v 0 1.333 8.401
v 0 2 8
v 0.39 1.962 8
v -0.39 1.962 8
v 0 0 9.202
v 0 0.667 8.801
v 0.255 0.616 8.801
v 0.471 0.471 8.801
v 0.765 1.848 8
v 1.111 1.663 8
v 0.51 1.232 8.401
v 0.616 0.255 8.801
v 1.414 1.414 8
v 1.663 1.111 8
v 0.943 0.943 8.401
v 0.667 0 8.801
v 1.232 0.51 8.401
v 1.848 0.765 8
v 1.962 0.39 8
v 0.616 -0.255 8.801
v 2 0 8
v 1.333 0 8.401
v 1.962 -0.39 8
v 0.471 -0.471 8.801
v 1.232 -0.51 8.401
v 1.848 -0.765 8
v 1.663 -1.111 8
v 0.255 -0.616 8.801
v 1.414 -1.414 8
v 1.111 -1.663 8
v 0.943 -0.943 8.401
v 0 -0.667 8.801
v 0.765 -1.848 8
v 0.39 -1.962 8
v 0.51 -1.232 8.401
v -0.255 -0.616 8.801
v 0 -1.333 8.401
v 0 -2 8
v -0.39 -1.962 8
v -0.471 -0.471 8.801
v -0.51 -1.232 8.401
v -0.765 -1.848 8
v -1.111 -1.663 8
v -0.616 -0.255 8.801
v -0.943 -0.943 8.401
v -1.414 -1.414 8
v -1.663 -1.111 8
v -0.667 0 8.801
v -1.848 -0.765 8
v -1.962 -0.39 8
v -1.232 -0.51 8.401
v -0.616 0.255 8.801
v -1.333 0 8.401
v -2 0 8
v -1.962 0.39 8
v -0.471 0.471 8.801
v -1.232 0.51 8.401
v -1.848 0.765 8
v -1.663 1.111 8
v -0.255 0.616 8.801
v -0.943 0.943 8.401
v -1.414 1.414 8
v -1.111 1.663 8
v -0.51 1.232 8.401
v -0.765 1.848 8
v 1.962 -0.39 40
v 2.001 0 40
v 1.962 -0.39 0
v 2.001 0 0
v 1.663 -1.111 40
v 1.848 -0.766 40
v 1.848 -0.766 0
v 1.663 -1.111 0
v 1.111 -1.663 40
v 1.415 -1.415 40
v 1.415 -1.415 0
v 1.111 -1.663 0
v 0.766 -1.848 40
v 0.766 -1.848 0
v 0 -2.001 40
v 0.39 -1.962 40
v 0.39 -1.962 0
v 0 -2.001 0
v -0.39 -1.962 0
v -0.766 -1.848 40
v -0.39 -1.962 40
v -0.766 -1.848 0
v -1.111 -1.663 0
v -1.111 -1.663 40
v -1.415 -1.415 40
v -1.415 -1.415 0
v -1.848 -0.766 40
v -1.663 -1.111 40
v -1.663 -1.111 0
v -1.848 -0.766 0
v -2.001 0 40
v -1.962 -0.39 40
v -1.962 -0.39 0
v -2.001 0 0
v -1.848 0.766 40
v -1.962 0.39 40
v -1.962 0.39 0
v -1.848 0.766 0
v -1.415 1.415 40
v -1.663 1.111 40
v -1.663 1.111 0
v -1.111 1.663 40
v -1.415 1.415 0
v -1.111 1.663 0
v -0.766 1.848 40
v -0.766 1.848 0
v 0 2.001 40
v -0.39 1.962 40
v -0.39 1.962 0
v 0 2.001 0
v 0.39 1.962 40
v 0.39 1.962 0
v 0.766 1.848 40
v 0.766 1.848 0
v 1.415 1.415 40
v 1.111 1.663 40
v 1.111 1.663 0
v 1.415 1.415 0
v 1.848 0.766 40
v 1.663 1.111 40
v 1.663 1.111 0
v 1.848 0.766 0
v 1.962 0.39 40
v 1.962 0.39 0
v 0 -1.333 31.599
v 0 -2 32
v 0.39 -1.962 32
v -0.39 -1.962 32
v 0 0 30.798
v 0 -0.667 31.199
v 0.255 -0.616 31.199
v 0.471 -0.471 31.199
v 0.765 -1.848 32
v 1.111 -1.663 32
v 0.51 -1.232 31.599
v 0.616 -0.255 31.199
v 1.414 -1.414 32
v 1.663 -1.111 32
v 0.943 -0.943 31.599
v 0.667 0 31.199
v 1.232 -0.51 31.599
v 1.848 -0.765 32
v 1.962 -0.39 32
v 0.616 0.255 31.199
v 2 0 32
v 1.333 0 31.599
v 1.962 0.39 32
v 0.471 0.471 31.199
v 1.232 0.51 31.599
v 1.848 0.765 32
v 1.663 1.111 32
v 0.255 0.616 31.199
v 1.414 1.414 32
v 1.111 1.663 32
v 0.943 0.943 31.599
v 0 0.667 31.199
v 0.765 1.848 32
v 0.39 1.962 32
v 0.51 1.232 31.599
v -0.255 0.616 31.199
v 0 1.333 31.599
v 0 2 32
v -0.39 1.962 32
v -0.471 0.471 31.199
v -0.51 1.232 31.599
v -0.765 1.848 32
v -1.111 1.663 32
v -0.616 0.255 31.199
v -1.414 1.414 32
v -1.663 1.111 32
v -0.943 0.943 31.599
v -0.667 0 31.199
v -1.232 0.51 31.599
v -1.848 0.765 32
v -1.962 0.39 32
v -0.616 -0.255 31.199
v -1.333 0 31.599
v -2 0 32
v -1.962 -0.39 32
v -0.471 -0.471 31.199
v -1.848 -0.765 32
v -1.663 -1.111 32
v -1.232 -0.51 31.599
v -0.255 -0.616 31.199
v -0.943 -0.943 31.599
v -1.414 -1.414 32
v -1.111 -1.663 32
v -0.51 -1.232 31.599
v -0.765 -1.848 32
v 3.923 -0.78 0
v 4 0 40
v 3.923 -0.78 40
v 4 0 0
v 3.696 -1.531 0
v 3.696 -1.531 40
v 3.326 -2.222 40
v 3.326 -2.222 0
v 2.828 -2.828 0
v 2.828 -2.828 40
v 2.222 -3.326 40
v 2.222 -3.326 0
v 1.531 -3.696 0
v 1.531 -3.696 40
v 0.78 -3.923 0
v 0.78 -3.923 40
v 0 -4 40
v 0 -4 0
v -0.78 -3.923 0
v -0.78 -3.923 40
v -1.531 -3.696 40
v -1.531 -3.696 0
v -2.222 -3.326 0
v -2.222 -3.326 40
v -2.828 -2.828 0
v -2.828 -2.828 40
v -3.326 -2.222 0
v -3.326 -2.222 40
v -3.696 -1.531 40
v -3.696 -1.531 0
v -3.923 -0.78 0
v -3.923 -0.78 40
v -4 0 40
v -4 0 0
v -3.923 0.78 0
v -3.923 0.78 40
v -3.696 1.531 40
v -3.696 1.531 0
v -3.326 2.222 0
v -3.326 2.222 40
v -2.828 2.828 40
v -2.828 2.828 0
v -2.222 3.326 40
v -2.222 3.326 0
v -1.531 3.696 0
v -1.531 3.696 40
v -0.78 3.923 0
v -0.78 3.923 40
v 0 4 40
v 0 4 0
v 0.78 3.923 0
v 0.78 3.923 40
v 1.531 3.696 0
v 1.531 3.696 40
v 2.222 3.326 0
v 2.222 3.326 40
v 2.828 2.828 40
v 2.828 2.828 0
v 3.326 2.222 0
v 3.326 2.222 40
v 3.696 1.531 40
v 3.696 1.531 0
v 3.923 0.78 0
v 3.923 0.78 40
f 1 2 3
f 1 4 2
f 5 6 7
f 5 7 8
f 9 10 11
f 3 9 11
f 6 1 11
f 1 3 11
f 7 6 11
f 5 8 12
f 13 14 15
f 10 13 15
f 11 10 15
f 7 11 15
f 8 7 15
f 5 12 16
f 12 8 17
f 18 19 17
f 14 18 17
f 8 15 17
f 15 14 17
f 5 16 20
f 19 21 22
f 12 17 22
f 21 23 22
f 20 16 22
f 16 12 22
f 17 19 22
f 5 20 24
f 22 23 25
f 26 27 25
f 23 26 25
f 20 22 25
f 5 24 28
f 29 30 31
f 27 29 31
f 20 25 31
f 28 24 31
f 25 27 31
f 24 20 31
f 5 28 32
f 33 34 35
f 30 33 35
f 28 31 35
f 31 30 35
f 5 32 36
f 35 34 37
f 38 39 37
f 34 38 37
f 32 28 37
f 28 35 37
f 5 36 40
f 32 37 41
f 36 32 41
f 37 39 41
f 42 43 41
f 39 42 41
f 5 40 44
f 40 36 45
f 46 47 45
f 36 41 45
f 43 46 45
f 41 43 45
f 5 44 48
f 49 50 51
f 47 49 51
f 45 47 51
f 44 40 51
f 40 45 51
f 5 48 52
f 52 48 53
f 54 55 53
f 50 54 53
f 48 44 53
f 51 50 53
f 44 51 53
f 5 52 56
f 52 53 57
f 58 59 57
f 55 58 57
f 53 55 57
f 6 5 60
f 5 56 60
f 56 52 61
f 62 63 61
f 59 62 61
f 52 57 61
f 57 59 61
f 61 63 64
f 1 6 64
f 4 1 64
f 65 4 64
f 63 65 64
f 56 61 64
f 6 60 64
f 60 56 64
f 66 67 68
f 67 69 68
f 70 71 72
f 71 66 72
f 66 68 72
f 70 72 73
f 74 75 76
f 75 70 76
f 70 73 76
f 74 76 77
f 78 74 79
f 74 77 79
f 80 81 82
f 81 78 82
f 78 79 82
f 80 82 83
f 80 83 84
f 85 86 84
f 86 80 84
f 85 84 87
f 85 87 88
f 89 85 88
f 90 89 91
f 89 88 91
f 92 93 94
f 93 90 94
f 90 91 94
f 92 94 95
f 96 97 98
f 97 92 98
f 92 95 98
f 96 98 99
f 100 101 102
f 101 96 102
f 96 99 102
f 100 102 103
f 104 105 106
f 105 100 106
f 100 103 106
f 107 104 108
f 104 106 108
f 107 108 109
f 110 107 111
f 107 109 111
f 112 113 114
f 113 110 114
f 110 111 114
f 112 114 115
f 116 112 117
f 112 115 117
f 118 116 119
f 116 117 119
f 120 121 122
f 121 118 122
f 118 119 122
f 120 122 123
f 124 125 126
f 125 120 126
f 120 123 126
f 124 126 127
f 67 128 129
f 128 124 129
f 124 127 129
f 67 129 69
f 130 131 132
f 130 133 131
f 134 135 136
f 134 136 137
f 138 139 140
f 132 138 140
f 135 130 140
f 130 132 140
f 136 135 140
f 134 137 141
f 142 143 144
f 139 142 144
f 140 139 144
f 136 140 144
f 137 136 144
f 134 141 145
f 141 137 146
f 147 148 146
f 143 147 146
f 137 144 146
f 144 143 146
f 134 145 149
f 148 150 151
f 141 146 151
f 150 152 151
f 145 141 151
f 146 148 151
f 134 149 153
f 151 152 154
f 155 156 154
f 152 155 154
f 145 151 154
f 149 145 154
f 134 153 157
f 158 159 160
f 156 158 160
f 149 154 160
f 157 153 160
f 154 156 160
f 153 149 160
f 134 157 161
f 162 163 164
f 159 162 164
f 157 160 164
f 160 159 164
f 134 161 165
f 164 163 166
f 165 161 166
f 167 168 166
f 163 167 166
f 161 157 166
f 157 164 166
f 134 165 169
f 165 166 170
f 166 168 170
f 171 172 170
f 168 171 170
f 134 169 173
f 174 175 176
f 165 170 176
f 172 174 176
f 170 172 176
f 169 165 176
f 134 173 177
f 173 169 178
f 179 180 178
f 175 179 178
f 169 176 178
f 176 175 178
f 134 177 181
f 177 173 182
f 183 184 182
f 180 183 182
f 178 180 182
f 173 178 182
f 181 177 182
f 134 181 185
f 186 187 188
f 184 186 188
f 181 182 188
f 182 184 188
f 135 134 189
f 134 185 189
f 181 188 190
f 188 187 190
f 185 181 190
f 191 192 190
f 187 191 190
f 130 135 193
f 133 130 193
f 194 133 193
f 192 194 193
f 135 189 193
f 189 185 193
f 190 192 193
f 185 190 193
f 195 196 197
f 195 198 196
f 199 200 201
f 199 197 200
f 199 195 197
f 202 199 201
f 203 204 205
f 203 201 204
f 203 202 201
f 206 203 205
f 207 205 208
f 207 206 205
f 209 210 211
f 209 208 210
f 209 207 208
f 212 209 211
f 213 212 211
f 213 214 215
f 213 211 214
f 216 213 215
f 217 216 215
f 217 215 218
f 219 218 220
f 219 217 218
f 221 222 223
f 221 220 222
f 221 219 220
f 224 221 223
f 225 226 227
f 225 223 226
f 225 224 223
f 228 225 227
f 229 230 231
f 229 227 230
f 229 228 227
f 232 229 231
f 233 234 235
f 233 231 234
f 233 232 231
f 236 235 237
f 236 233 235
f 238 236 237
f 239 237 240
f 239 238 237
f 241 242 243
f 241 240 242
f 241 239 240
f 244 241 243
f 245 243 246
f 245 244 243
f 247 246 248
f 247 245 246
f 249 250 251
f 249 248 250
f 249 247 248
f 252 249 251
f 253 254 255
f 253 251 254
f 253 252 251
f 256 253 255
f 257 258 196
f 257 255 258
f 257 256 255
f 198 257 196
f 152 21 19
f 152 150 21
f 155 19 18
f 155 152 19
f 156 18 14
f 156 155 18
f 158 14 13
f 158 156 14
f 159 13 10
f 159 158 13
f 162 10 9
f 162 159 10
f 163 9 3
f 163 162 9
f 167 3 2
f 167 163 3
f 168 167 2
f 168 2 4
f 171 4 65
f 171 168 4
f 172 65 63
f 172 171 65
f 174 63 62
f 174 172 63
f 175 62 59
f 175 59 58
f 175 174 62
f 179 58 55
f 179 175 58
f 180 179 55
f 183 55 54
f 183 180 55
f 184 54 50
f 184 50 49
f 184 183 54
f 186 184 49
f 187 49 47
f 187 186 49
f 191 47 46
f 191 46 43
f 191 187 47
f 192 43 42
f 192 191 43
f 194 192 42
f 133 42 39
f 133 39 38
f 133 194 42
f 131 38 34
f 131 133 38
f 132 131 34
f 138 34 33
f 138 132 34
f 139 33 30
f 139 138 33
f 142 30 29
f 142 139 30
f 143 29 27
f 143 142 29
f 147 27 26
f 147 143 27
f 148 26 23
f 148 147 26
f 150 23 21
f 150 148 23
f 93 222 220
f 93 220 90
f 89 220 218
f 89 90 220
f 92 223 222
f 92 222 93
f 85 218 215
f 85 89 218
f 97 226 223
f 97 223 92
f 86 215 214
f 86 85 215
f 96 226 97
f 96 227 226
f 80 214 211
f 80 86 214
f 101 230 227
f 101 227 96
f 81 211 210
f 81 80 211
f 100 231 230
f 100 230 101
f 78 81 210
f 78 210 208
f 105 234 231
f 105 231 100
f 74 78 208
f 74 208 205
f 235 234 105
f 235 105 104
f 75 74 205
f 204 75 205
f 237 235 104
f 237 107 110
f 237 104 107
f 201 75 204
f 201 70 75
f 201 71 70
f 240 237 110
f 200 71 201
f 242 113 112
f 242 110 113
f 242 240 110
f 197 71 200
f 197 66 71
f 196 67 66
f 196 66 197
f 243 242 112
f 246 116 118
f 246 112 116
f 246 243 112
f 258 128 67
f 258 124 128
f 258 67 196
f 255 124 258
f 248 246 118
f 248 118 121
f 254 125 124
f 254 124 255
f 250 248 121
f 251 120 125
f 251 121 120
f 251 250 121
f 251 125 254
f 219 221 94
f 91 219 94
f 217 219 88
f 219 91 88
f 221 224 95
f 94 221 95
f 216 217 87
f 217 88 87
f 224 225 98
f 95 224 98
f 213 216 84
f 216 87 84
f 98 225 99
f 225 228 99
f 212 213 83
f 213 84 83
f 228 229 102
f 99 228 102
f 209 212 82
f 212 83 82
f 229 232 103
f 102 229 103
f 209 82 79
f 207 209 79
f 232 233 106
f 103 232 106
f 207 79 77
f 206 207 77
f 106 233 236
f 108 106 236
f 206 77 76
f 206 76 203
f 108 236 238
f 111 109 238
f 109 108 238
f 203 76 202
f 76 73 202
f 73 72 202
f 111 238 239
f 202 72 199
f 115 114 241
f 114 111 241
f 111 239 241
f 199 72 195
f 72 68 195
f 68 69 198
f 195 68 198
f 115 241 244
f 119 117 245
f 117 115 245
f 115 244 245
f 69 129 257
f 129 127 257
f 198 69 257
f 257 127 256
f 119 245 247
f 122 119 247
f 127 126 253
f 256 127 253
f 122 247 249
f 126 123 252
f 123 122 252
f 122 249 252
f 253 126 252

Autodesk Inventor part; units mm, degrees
ref_plane "YZ Plane" through (0, 0, 0) normal (1, 0, 0) x (0, 1, 0)
ref_plane "XZ Plane" through (0, 0, 0) normal (0, 1, 0) x (-1, 0, 0)
ref_plane "XY Plane" through (0, 0, 0) normal (0, 0, 1) x (1, 0, 0)
sketch "スケッチ1" plane through (0, 0, 0) normal (0, 0, 1) x (1, 0, 0)
  circle A0 centre (0, 0) radius 4
  circle A1 centre (0, 0) radius 2.0005
  dimension "d0" = 8
  dimension "d1" = 4.001
extrude "押し出し1" add sketch "スケッチ1" along normal blind 40
sketch "スケッチ2" plane through (0, 0, 40) normal (0, 0, 1) x (1, 0, 0)
  circle A0 centre (0, 0) radius 2
  dimension "d4" = 4
extrude "押し出し2" add sketch "スケッチ2" against normal blind 40
hole "穴1" at (0, 0, 40) direction (0, 0, -1) diameter 4 depth 8 tip angle 118
hole "穴2" at (0, 0, 0) direction (0, 0, 1) diameter 4 depth 8 tip angle 118
properties part number "スペーサーm4-40　簡易筒型" material "アルミニウム 2014-T4"
